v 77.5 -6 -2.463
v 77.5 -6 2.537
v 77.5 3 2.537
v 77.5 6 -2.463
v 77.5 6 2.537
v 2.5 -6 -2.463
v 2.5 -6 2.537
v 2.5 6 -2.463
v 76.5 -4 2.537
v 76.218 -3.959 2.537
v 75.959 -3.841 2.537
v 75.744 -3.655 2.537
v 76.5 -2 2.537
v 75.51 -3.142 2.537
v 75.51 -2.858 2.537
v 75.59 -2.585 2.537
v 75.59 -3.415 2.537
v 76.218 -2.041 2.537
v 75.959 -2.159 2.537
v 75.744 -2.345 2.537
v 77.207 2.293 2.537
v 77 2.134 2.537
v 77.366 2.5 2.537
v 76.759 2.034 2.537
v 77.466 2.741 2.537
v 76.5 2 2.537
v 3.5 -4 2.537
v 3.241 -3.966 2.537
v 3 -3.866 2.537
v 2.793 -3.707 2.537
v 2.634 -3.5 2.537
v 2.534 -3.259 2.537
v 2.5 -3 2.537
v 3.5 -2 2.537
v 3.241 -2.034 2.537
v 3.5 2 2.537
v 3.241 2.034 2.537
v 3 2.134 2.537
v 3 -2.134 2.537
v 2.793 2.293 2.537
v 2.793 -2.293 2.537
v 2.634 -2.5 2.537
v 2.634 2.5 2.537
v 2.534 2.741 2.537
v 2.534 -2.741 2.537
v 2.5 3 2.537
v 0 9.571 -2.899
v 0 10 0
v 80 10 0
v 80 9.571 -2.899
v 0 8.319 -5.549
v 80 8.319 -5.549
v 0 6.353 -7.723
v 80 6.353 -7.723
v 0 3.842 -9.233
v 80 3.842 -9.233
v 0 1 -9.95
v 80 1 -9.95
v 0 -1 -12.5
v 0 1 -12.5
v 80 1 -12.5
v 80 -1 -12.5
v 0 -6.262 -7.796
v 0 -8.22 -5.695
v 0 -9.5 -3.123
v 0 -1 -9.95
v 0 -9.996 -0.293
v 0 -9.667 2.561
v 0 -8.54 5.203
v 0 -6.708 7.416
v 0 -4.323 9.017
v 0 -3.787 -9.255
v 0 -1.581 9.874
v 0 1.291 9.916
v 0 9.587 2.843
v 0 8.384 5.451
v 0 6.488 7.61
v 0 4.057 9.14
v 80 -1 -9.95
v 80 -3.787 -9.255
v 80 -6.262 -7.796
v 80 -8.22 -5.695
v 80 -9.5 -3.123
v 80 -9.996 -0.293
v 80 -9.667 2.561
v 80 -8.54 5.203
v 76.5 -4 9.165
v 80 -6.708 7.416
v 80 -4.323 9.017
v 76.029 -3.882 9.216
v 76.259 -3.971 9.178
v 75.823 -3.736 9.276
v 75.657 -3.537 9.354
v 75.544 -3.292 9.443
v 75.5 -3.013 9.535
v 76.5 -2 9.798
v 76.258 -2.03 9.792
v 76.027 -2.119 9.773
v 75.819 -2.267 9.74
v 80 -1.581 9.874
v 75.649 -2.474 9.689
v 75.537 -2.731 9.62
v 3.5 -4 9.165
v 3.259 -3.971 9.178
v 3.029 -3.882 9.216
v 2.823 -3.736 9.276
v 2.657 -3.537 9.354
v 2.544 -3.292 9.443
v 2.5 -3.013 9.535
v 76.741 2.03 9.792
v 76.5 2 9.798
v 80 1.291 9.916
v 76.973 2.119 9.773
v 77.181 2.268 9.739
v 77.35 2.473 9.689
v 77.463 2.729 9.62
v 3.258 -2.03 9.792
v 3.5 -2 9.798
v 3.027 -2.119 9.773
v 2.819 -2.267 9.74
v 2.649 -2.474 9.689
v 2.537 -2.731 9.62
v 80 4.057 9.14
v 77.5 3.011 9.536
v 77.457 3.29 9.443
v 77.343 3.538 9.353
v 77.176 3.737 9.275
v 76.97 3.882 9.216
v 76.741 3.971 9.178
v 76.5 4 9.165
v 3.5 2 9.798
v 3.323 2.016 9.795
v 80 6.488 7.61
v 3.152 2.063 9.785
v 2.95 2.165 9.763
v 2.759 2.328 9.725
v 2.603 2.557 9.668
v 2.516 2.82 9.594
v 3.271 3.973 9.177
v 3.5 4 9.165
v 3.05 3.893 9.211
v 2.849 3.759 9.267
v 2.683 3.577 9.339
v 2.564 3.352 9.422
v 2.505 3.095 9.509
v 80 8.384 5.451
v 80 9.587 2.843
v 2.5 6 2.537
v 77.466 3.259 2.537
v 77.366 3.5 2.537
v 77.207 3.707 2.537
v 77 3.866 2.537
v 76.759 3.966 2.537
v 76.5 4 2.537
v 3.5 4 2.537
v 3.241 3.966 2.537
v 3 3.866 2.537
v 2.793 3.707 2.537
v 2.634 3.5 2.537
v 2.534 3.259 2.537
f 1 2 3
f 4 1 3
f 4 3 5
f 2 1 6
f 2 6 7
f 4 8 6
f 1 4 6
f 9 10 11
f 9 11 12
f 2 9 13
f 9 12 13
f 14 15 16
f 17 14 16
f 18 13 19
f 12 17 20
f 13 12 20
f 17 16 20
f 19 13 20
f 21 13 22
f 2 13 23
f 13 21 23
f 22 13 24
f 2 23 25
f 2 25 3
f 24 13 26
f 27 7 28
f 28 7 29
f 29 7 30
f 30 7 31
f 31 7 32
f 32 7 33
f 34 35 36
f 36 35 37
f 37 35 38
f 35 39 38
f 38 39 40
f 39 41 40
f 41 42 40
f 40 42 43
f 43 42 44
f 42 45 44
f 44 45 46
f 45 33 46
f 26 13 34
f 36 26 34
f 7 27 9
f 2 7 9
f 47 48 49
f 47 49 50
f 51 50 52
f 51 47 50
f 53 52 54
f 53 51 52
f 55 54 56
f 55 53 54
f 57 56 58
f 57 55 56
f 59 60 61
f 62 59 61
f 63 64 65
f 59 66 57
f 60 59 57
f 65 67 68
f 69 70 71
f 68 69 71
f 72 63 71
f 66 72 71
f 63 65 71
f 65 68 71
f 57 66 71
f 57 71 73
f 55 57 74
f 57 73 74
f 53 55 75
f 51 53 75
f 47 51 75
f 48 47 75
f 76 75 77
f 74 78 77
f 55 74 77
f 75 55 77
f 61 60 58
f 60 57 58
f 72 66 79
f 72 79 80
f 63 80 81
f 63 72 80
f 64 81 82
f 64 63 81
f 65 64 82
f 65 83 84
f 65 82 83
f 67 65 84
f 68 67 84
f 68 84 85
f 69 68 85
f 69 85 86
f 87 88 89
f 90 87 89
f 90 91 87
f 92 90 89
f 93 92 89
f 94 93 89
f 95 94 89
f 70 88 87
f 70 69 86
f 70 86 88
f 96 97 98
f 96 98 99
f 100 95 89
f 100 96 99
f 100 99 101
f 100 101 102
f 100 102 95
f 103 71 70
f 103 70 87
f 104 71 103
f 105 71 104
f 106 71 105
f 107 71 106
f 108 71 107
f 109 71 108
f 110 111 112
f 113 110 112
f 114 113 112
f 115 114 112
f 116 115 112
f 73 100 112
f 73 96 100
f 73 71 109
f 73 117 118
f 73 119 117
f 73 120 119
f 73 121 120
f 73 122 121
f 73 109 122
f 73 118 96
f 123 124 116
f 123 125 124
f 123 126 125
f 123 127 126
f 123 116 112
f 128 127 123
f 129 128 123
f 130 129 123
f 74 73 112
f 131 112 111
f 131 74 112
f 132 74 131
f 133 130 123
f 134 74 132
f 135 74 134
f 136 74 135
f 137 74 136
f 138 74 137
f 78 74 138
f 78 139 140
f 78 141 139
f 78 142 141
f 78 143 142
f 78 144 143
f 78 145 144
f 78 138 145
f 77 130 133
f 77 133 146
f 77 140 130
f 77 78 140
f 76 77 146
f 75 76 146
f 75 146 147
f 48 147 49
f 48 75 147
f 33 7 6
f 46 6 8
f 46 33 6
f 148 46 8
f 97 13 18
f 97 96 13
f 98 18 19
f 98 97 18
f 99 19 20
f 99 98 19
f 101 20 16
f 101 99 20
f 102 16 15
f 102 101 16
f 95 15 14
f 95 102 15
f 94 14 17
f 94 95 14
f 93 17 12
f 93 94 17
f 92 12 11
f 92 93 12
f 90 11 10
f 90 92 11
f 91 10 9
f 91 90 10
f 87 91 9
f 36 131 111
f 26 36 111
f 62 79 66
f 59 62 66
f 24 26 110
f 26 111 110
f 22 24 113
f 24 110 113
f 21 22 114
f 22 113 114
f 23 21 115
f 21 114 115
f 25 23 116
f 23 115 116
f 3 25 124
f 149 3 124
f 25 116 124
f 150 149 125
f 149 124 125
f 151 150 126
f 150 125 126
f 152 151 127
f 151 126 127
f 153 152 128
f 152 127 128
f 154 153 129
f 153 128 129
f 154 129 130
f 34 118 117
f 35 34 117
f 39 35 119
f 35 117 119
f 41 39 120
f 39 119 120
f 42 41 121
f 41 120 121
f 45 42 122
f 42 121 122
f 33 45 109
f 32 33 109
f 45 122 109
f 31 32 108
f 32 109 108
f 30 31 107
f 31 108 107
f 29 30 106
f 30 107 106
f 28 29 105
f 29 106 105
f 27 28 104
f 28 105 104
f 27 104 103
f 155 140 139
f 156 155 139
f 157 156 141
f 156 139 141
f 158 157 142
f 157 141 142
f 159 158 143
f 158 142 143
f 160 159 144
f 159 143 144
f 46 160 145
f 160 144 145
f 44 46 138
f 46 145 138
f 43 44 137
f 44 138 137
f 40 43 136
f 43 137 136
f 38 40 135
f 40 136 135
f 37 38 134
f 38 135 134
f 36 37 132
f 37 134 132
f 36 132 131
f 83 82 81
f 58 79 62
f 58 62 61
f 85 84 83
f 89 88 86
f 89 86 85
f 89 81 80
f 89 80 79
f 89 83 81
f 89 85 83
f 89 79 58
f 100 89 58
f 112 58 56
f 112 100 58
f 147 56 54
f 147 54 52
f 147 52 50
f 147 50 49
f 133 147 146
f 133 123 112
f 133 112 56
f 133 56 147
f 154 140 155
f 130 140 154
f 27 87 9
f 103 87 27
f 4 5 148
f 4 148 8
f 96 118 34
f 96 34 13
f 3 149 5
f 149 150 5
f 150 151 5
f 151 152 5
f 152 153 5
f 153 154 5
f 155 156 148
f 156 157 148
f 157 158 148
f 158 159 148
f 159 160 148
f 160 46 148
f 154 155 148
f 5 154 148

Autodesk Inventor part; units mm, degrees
sketch "草图1" plane through (0, 0, 0) normal (1, 0, 0) x (0, 1, 0)
  circle A0 centre (0, 0) radius 10
  dimension "d0" = 20
extrude "拉伸1" add sketch "草图1" along normal blind 80
ref_plane "工作平面1" through (2.5, 0, 0) normal (1, 0, 0) x (0, 1, 0)
sketch "草图2" plane through (2.5, 0, 0) normal (1, 0, 0) x (0, 1, 0)
  circle A0 centre (0, 0) radius 10 projected
  line L0 (6, -2.4628) -> (-6, -2.4628)
  line L1 (-6, -2.4628) -> (-6, 2.5372)
  line L2 (-6, 2.5372) -> (6, 2.5372)
  line L3 (6, 2.5372) -> (6, -2.4628)
  line L4 (6.59, 0.0372) -> (-6.5609, 0.0372)
  point P0 (10, 0)
  point P1 (-10, 0)
  dimension "d4" = 4
  dimension "d5" = 4
  dimension "d6" = 5
extrude "拉伸2" cut sketch "草图2" along normal blind 75 contours L0 L1 L4 L3 | L4 L1 L2 L3
ref_plane "工作平面3" through (0, 0, 10) normal (0, 0, 1) x (1, 0, 0)
sketch "草图5" plane through (0, 0, 10) normal (0, 0, 1) x (1, 0, 0)
  line L0 (-2.1953, 0) -> (98.9957, 0)
  line L1 (2.5, 6) -> (2.5, -6) projected
  line L2 (77.5, 6) -> (77.5, -6) projected
  line L3 (2.5, -6) -> (2.5, 6) projected
  line L4 (3.5, 4) -> (76.5, 4)
  line L5 (76.5, -4) -> (3.5, -4)
  line L6 (2.5, -3) -> (2.5, -2)
  arc A0 (3.5, 4) -> (3.5, 2) centre (3.5, 3) ccw
  arc A1 (3.5, -2) -> (3.5, -4) centre (3.5, -3) ccw
  line L7 (3.5, 2) -> (76.5, 2)
  line L8 (3.5, -2) -> (76.5, -2)
  arc A2 (76.5, 2) -> (76.5, 4) centre (76.5, 3) ccw
  circle A3 centre (76.5, -3) radius 1
  point P0 (0, 0)
  point P1 (3.5, 0)
  point P2 (76.5, 0)
  dimension "d52" = 8
  dimension "d53" = 1
  dimension "d54" = 1
  dimension "d55" = 1
extrude "拉伸3" cut sketch "草图5" against normal blind 7.5 contours A0 L4 A2 L7 | A1 L8 A3 L5
ref_plane "工作平面4" through (0, 0, -7) normal (0, 0, 1) x (1, 0, 0)
sketch "草图6" plane through (0, 0, -7) normal (0, 0, 1) x (1, 0, 0)
  line L0 (0, -10) -> (0, 10) projected
  line L1 (80, -10) -> (80, 10) projected
  line L2 (0, 1) -> (80, 1)
  line L3 (80, 1) -> (80, -1)
  line L4 (80, -1) -> (0, -1)
  line L5 (0, -1) -> (0, 1)
  line L6 (-22.5072, 0) -> (150.7978, 0)
  point P0 (0, 0)
  point P1 (0, -1)
  dimension "d39" = 2
extrude "拉伸4" add sketch "草图6" against normal blind 5.5
ref_plane "工作平面5" through (2.5, -6, -2.4628) normal (0, 0, 1) x (1, 0, 0)
sketch "草图7" plane through (2.5, -6, -2.4628) normal (0, 0, 1) x (1, 0, 0)
  point P0 (-2.5, 6)
properties part number "Inner_telescope_arm"
